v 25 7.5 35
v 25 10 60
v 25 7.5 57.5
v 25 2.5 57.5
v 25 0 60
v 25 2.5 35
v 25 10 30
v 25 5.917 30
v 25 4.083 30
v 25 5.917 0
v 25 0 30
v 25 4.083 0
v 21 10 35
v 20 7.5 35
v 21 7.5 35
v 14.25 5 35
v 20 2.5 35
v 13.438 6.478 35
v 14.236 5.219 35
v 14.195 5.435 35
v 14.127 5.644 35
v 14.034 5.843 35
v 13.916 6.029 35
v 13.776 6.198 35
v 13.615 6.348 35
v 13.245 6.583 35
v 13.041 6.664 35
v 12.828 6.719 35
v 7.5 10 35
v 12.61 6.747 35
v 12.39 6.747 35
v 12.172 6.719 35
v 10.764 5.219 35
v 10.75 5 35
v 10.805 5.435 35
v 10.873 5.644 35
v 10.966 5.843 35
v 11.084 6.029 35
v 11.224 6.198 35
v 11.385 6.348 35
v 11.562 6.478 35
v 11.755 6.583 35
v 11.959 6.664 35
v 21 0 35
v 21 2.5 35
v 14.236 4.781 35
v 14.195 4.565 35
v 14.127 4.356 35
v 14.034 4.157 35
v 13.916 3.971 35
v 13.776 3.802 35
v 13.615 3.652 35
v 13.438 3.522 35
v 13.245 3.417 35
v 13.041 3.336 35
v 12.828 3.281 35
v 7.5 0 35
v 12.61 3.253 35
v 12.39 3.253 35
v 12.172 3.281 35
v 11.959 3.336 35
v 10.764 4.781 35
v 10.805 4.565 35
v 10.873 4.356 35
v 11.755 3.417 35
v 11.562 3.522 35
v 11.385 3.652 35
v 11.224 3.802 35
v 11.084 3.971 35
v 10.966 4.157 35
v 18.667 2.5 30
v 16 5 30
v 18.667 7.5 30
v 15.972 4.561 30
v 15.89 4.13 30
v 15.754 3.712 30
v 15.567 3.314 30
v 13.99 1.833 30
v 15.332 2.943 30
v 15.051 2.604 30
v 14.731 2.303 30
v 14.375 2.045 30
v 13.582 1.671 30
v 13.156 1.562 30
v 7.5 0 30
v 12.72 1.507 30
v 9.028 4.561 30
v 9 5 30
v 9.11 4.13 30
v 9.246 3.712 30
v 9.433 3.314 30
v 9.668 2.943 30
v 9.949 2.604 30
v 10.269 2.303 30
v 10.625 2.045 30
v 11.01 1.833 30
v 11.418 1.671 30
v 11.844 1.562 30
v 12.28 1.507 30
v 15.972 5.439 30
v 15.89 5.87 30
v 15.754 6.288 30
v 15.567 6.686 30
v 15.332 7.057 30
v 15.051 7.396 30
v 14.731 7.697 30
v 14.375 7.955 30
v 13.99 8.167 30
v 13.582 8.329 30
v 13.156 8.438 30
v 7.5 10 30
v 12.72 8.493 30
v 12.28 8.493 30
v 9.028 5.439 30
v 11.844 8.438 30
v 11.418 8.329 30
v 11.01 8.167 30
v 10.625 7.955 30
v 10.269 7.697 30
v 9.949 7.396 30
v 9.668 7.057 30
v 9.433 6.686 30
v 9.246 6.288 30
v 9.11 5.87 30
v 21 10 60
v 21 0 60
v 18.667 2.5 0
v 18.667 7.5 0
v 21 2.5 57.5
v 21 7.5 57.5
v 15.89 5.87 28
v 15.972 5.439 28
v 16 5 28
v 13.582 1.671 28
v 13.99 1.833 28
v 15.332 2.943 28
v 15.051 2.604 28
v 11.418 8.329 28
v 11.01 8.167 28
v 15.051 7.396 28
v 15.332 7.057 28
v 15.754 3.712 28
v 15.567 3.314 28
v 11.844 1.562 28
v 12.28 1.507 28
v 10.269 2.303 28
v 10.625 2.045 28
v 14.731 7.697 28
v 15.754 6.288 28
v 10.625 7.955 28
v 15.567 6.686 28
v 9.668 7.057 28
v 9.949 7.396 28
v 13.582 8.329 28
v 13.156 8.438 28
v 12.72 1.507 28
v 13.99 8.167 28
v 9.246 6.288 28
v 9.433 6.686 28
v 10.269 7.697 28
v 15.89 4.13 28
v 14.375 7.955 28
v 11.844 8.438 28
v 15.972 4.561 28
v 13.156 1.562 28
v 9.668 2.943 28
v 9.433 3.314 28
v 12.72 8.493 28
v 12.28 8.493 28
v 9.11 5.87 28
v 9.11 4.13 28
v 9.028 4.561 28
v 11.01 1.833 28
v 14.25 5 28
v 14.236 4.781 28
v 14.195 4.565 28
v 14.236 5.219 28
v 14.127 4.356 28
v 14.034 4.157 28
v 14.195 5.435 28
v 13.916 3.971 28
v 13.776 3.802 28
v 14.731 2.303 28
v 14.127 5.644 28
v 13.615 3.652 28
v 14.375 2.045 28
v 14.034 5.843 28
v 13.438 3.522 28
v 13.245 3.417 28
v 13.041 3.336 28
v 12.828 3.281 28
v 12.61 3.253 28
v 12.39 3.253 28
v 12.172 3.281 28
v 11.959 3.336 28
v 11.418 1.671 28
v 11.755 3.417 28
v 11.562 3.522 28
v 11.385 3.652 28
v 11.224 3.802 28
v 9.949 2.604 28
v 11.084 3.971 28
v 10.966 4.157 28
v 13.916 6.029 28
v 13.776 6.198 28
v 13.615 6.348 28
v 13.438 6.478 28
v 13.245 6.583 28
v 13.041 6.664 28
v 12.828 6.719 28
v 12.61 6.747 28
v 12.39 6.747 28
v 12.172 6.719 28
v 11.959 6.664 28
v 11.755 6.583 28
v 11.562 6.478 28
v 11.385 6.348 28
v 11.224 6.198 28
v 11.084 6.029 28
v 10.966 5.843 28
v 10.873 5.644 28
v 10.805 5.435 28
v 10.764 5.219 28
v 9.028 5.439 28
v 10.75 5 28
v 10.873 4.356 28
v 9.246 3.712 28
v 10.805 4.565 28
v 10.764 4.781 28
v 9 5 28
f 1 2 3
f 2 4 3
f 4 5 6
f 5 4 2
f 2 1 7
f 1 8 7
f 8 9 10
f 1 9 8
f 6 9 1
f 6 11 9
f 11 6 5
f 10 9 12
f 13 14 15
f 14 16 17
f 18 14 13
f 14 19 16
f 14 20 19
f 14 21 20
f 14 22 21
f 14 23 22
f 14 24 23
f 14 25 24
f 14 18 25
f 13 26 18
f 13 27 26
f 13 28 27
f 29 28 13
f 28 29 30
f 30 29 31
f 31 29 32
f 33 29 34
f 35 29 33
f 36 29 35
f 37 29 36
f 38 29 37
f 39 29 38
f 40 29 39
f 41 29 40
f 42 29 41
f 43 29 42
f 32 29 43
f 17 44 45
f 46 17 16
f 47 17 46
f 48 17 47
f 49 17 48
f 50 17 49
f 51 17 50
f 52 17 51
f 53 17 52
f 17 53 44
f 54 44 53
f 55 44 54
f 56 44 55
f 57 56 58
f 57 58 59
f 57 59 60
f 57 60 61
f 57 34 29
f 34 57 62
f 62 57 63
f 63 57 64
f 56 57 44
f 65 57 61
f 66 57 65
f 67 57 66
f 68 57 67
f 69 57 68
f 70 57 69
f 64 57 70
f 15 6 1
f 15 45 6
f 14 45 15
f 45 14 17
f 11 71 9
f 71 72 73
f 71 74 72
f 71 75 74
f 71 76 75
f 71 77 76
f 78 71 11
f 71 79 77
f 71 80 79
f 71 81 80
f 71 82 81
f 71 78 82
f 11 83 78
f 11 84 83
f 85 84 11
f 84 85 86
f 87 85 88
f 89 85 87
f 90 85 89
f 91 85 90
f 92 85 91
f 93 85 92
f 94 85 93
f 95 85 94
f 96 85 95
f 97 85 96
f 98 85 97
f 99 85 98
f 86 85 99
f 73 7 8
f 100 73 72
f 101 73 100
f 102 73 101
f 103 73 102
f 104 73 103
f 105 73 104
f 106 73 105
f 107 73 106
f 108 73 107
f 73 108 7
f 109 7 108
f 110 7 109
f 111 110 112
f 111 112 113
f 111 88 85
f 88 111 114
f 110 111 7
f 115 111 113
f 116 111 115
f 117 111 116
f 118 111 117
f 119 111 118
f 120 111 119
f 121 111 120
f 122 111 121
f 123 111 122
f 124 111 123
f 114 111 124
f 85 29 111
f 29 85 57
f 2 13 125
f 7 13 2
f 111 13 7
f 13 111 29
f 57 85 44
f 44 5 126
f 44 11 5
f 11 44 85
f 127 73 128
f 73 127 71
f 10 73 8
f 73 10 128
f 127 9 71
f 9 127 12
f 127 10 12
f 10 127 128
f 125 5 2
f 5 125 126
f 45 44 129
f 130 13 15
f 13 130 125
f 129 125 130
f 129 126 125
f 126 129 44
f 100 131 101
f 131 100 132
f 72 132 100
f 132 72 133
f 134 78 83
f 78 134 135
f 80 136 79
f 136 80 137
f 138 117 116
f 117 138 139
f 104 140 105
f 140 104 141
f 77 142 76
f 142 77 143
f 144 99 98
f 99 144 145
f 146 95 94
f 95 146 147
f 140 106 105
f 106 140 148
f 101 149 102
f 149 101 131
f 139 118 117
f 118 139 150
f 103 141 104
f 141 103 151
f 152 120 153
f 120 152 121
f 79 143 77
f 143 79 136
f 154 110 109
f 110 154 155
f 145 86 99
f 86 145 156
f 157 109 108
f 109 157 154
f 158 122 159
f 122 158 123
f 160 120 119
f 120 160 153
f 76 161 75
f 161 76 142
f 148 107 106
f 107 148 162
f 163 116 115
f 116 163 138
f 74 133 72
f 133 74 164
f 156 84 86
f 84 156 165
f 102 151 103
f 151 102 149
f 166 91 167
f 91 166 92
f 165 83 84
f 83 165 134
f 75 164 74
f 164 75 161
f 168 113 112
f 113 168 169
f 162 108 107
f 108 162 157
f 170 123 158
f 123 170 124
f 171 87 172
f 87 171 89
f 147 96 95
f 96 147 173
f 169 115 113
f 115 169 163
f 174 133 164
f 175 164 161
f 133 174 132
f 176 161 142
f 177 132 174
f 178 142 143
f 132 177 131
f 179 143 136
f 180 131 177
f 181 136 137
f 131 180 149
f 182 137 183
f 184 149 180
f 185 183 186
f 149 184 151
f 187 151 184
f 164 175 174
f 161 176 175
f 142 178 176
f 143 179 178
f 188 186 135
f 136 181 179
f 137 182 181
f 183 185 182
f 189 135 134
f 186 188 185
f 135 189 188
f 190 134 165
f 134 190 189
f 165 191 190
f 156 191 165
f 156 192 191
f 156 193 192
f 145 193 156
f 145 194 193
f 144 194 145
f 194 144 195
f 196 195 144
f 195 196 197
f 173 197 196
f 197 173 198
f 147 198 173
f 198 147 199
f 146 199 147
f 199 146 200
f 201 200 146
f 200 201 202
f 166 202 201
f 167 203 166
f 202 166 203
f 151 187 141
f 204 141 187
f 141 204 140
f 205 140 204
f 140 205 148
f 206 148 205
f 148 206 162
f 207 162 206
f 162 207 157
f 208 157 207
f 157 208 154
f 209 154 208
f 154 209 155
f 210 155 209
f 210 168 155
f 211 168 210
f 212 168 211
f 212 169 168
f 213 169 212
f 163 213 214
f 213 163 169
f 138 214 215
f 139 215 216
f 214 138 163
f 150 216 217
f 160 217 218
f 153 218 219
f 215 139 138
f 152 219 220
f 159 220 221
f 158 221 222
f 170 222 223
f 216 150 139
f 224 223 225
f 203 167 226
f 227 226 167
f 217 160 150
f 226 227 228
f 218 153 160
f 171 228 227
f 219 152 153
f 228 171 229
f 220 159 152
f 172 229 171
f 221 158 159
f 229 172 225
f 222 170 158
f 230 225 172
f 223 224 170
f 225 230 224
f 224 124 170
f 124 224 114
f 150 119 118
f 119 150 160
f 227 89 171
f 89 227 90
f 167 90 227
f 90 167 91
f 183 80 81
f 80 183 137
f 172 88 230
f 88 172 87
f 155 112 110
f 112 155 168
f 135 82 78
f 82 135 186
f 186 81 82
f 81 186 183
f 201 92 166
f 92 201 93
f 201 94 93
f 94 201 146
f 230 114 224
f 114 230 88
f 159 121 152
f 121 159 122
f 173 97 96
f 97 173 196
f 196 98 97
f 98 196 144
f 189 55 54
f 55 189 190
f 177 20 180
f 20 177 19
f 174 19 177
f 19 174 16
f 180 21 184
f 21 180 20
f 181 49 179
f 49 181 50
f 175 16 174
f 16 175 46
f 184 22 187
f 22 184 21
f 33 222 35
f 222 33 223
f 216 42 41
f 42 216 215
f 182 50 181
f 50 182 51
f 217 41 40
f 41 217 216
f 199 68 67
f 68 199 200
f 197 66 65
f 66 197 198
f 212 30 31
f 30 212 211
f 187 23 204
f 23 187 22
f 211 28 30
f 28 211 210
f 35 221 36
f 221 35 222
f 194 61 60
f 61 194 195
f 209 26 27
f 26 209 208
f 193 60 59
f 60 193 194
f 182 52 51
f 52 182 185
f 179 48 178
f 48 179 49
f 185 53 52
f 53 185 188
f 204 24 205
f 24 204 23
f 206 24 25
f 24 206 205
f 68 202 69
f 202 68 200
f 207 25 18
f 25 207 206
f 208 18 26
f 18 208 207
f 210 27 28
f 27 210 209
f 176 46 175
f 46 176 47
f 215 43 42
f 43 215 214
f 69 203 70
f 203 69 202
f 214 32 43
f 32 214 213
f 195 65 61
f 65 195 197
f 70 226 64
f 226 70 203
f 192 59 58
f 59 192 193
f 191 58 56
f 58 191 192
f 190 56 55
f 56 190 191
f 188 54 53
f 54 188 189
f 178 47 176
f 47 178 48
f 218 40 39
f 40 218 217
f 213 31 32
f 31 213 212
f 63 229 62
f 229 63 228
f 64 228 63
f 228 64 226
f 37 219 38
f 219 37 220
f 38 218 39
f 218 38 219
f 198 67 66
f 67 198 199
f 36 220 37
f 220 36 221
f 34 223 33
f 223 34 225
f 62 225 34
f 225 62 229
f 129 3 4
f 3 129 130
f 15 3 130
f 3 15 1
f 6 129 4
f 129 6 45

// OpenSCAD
$fn=50;

end_stop=[25, 10];

//a();
b();
//mirror([0, 1, 0]) c();

module a() {
    difference() {
        mirror([0, 1, 0]) rotate([90, 0, 0]) difference() {
            cube([end_stop[0], end_stop[1], 5+10]);
            translate([(end_stop[0]-19)/2, end_stop[1]/2]) cylinder(d=3, h=5);
            translate([end_stop[0]-(end_stop[0]-19)/2, end_stop[1]/2]) cylinder(d=3, h=5);
            translate([(end_stop[0]-12)/2, 1]) cube([12, end_stop[1]-1*2, 2]);
        }
    
        translate([end_stop[0]/2, 10/2+5]) cylinder(d=3, h=99);
        translate([end_stop[0]/2, 10/2+5]) cylinder(d=7, h=7);
        translate([end_stop[0]-6/2, 10/2+5]) resize([10, 5, 99]) cylinder(d=6, h=99, $fn=3);
        translate([0, 5]) cube([end_stop[0]/2-10/2, 10, 10]);
    }
}

module b() {
    h=30;
    difference() {
        union() {
            translate([end_stop[0]/2-10/2, 0, h]) cube([end_stop[0]/2+10/2, 10, 5]);
            translate([end_stop[0]-6/2, 10/2]) resize([10, 5, h]) cylinder(d=6, h=99, $fn=3);
            translate([end_stop[0]-4, 0, h]) cube([4, 10, 30]);
            translate([end_stop[0]/2, 10/2, h-2]) cylinder(d=7, h=2);
        }
        translate([end_stop[0], 0]) cube([99, 99, 99]);
        translate([end_stop[0]/2, 10/2]) cylinder(d=3+0.5, h=99);
        translate([end_stop[0]-5, (10-5)/2, h+5]) cube([5, 5, 30-5-5/2]);
    }
}

module c() {
    solt_width=6.4;
    cube([7, 2, 20+30]);
    difference() {
        hull() {
            cube([7, 2, 20]);
            translate([-5, 0, 0]) cube([5, 20, 20]);
        }
        translate([0, 20-7, 20/2]) rotate([0, -90, 0]) m5_screw();
    }
    translate([-5-3, 0, (20-solt_width)/2]) cube([3, 20-7*2, solt_width]);
}

module m5_screw() {
    cylinder(d=5, h=10);
    translate([0, 0, -10]) cylinder(d=8, h=10);
}
